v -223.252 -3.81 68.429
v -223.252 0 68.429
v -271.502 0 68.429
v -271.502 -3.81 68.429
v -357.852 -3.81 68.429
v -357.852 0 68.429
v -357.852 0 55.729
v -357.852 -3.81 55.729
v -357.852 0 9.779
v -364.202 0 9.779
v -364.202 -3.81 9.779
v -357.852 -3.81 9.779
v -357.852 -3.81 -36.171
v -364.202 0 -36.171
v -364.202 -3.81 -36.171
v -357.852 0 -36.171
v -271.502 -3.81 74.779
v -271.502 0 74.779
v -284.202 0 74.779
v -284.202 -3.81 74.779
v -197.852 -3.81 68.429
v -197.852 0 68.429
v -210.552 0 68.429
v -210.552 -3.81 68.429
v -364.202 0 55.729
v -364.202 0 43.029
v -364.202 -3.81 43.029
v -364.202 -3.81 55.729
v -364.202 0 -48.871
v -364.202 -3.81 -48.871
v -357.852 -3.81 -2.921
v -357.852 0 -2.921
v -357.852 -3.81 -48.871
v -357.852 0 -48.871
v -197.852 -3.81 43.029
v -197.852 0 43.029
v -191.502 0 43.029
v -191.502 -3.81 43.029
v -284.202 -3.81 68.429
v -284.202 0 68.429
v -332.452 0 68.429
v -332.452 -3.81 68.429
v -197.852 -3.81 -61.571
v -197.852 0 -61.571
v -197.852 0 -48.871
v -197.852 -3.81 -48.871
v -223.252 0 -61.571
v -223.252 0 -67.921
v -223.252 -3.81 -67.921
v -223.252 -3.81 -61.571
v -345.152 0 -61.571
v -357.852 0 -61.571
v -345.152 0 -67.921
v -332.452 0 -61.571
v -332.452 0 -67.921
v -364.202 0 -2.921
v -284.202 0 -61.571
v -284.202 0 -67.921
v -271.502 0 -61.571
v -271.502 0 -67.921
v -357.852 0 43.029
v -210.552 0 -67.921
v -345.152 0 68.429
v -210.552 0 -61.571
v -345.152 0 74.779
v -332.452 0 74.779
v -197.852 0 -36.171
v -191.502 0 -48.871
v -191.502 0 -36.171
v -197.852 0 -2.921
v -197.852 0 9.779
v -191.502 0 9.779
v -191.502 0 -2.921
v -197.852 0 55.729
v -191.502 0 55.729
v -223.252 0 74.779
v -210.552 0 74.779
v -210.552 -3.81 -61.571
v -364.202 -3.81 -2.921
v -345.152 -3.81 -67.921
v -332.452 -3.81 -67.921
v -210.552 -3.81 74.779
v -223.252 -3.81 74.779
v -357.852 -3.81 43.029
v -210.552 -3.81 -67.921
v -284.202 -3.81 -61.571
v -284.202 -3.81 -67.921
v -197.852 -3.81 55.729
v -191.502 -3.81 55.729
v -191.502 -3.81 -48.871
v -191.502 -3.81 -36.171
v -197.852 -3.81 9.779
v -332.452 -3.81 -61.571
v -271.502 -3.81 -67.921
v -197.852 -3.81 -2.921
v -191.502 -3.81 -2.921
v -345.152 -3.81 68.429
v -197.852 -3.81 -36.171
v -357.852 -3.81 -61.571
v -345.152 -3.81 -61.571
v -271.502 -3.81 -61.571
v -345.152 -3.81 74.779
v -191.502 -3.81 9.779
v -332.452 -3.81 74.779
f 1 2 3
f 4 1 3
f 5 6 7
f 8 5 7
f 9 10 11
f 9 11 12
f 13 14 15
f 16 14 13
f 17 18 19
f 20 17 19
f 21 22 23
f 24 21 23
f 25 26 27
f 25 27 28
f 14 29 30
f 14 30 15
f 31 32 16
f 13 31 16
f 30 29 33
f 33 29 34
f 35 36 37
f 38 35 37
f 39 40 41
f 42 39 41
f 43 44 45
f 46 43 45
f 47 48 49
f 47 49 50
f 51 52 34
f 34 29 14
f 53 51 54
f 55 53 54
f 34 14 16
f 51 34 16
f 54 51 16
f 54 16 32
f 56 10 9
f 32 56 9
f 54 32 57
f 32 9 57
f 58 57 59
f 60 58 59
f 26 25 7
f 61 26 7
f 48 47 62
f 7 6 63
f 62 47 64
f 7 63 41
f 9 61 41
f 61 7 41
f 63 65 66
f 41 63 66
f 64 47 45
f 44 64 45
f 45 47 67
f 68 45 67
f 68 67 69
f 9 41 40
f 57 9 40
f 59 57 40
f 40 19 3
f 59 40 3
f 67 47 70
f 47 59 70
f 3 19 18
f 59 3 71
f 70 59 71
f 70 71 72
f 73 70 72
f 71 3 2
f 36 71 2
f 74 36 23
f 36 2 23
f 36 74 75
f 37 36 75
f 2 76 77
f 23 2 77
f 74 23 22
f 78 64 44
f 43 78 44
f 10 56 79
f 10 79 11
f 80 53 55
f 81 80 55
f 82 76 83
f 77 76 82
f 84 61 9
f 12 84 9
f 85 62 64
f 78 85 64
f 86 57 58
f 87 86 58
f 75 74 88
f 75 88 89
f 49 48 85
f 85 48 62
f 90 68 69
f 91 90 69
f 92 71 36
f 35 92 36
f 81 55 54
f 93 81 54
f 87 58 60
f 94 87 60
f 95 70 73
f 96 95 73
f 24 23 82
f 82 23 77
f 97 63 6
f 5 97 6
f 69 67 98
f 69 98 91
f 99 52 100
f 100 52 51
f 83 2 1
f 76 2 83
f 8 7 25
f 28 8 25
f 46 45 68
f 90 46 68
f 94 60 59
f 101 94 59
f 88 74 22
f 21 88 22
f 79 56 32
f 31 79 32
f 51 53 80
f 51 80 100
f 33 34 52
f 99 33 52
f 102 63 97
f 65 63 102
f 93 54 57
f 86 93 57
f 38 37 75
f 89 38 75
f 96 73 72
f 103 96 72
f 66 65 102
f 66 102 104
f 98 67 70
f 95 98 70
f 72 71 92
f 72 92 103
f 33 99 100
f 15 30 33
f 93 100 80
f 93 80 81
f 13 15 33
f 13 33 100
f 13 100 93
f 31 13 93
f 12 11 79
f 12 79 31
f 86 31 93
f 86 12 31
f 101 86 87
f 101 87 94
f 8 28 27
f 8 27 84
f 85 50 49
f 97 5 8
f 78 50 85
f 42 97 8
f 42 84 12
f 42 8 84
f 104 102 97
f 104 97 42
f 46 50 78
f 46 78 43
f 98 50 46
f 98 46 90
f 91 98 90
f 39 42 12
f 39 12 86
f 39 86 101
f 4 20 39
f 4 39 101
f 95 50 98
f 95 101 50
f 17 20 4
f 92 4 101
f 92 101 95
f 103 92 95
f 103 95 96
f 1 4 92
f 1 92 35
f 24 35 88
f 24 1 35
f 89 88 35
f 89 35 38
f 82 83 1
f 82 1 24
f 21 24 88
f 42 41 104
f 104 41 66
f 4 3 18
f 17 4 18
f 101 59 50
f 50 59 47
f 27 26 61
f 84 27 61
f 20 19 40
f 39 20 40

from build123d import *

# Parameters (mm, degrees)
F0_W     = 6.35
F0_H     = 12.7
F0_W_2   = 12.7
F0_H_2   = 6.35
F1_DEPTH = 3.81


# Not quite as in the source:
# - a feature names something its author has since deleted; it is built from what else it names


with BuildPart() as f1:
    # F0 (on Front) → F1 (new body)
    with BuildSketch(Plane.XZ):
        with Locations((-354.6769669852, 49.3793434303)):
            Rectangle(F0_W, F0_H)
        with Locations((-361.0269669852, 49.3793434303)):
            Rectangle(F0_W, F0_H)
        Polygon((-332.4519669852, -61.5706565697), (-284.2019669852, -61.5706565697), (-284.2019669852, -55.2206565697), (-277.8519669852, -55.2206565697), (-277.8519669852, 62.0793434303), (-284.2019669852, 62.0793434303), (-284.2019669852, 68.4293434303), (-332.4519669852, 68.4293434303), (-332.4519669852, 62.0793434303), (-345.1519669852, 62.0793434303), (-345.1519669852, 68.4293434303), (-357.8519669852, 68.4293434303), (-357.8519669852, 55.7293434303), (-351.5019669852, 55.7293434303), (-351.5019669852, 43.0293434303), (-357.8519669852, 43.0293434303), (-357.8519669852, 9.7793434303), (-351.5019669852, 9.7793434303), (-351.5019669852, -2.9206565697), (-357.8519669852, -2.9206565697), (-357.8519669852, -36.1706565697), (-351.5019669852, -36.1706565697), (-351.5019669852, -48.8706565697), (-357.8519669852, -48.8706565697), (-357.8519669852, -61.5706565697), (-345.1519669852, -61.5706565697), (-345.1519669852, -55.2206565697), (-332.4519669852, -55.2206565697), align=None)
        with Locations((-338.8019669852, 65.2543434303)):
            Rectangle(F0_W_2, F0_H_2)
        with Locations((-338.8019669852, 71.6043434303)):
            Rectangle(F0_W_2, F0_H_2)
        Polygon((-210.5519669852, -61.5706565697), (-197.8519669852, -61.5706565697), (-197.8519669852, -48.8706565697), (-204.2019669852, -48.8706565697), (-204.2019669852, -36.1706565697), (-197.8519669852, -36.1706565697), (-197.8519669852, -2.9206565697), (-204.2019669852, -2.9206565697), (-204.2019669852, 9.7793434303), (-197.8519669852, 9.7793434303), (-197.8519669852, 43.0293434303), (-204.2019669852, 43.0293434303), (-204.2019669852, 55.7293434303), (-197.8519669852, 55.7293434303), (-197.8519669852, 68.4293434303), (-210.5519669852, 68.4293434303), (-210.5519669852, 62.0793434303), (-223.2519669852, 62.0793434303), (-223.2519669852, 68.4293434303), (-271.5019669852, 68.4293434303), (-271.5019669852, 62.0793434303), (-277.8519669852, 62.0793434303), (-277.8519669852, -55.2206565697), (-271.5019669852, -55.2206565697), (-271.5019669852, -61.5706565697), (-223.2519669852, -61.5706565697), (-223.2519669852, -55.2206565697), (-210.5519669852, -55.2206565697), align=None)
        Polygon((-284.2019669852, 68.4293434303), (-277.8519669852, 68.4293434303), (-271.5019669852, 68.4293434303), (-271.5019669852, 74.7793434303), (-284.2019669852, 74.7793434303), align=None)
        with Locations((-274.6769669852, 65.2543434303)):
            Rectangle(F0_W, F0_H_2)
        with Locations((-281.0269669852, 65.2543434303)):
            Rectangle(F0_W, F0_H_2)
        with Locations((-216.9019669852, 71.6043434303)):
            Rectangle(F0_W_2, F0_H_2)
        with Locations((-216.9019669852, 65.2543434303)):
            Rectangle(F0_W_2, F0_H_2)
        with Locations((-354.6769669852, 3.4293434303)):
            Rectangle(F0_W, F0_H)
        with Locations((-361.0269669852, 3.4293434303)):
            Rectangle(F0_W, F0_H)
        with Locations((-361.0269669852, -42.5206565697)):
            Rectangle(F0_W, F0_H)
        with Locations((-338.8019669852, -64.7456565697)):
            Rectangle(F0_W_2, F0_H_2)
        with Locations((-354.6769669852, -42.5206565697)):
            Rectangle(F0_W, F0_H)
        with Locations((-338.8019669852, -58.3956565697)):
            Rectangle(F0_W_2, F0_H_2)
        with Locations((-281.0269669852, -58.3956565697)):
            Rectangle(F0_W, F0_H_2)
        with Locations((-274.6769669852, -58.3956565697)):
            Rectangle(F0_W, F0_H_2)
        Polygon((-271.5019669852, -67.9206565697), (-271.5019669852, -61.5706565697), (-277.8519669852, -61.5706565697), (-284.2019669852, -61.5706565697), (-284.2019669852, -67.9206565697), align=None)
        with Locations((-216.9019669852, -64.7456565697)):
            Rectangle(F0_W_2, F0_H_2)
        with Locations((-216.9019669852, -58.3956565697)):
            Rectangle(F0_W_2, F0_H_2)
        with Locations((-201.0269669852, -42.5206565697)):
            Rectangle(F0_W, F0_H)
        with Locations((-194.6769669852, -42.5206565697)):
            Rectangle(F0_W, F0_H)
        with Locations((-201.0269669852, 3.4293434303)):
            Rectangle(F0_W, F0_H)
        with Locations((-194.6769669852, 3.4293434303)):
            Rectangle(F0_W, F0_H)
        with Locations((-201.0269669852, 49.3793434303)):
            Rectangle(F0_W, F0_H)
        with Locations((-194.6769669852, 49.3793434303)):
            Rectangle(F0_W, F0_H)
    extrude(amount=F1_DEPTH)


solid = f1.part
